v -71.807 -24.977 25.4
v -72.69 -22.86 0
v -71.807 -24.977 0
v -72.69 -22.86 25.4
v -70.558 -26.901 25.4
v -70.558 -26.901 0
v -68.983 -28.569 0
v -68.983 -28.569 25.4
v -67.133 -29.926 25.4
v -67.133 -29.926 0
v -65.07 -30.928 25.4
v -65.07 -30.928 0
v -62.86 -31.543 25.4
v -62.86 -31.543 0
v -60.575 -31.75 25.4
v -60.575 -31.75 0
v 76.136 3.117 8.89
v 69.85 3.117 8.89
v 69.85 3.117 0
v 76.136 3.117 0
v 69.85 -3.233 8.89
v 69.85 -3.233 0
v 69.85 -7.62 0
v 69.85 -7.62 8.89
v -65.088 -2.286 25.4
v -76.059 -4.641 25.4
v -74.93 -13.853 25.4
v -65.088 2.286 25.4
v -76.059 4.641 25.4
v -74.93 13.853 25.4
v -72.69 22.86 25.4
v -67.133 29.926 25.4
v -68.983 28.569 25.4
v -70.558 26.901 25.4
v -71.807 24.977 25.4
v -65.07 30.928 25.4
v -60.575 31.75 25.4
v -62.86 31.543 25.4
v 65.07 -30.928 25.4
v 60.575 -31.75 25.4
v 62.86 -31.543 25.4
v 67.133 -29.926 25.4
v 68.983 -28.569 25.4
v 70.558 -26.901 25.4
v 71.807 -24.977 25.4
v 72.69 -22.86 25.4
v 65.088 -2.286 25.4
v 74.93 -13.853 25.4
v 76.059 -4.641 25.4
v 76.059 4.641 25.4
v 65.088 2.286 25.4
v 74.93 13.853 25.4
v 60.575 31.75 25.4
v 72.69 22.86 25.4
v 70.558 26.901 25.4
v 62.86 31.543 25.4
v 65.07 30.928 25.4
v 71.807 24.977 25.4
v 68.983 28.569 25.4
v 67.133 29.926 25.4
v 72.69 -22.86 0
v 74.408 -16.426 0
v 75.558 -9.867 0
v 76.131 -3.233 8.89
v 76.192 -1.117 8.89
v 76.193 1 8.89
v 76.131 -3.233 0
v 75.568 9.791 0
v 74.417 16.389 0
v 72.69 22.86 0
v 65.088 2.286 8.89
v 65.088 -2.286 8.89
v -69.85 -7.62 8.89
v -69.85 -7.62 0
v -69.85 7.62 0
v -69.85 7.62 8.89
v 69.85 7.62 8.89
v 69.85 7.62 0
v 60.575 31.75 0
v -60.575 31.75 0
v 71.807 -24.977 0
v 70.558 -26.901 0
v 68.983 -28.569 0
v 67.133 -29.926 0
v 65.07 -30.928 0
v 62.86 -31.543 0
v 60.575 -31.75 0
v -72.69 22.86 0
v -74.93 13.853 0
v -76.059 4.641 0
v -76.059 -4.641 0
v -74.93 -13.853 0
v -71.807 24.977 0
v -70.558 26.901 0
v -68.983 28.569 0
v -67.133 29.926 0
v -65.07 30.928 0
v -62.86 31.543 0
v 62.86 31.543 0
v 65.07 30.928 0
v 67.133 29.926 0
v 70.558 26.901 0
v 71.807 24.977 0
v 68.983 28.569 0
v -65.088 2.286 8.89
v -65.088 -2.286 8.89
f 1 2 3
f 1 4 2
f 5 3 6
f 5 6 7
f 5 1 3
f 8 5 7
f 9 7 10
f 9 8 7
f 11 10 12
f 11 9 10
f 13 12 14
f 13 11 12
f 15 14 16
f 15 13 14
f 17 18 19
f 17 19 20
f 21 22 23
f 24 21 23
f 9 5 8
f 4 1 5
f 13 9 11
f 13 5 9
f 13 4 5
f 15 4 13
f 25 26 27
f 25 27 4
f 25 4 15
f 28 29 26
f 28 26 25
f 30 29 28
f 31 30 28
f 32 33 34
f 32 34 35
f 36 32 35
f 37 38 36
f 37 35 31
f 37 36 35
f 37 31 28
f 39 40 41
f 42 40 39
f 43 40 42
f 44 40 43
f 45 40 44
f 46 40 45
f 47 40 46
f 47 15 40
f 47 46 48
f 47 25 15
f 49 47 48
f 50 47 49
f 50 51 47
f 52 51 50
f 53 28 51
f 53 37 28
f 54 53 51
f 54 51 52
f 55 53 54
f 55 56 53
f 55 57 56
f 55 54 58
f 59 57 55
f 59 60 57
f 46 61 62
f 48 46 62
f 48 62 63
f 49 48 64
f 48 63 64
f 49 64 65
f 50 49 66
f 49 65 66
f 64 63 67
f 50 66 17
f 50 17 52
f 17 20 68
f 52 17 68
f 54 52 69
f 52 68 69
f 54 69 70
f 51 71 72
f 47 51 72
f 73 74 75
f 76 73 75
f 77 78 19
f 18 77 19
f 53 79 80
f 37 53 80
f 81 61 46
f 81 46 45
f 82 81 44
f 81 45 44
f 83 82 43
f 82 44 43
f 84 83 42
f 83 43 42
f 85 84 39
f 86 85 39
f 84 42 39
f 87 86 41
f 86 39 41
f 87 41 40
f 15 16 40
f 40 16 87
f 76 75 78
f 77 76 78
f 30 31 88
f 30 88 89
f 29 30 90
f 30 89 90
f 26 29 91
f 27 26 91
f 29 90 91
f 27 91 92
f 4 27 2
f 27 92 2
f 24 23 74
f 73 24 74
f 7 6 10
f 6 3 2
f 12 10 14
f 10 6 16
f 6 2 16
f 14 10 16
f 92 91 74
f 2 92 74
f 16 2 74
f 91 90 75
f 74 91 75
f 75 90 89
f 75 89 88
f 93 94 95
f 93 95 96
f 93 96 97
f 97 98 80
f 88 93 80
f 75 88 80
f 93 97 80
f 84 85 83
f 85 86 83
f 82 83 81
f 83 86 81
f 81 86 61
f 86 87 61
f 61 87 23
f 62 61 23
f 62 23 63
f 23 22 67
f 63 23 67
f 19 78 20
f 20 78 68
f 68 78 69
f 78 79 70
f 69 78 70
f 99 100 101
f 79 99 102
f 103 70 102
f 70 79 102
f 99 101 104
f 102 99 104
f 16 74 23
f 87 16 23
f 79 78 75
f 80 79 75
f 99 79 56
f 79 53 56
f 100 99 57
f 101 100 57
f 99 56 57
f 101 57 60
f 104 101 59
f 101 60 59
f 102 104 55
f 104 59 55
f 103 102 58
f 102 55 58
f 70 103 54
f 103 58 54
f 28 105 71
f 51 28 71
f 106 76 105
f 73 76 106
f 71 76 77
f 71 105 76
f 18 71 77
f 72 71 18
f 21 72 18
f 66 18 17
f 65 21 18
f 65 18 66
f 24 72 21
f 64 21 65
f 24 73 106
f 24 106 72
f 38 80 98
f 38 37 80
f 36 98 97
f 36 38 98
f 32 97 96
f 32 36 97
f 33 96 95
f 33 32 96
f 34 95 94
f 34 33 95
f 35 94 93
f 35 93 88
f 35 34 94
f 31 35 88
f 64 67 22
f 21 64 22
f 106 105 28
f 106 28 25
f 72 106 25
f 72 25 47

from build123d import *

# Parameters (mm, degrees)
F1_DEPTH = 25.4
F2_W     = 130.175
F2_H     = 4.572
F3_DEPTH = 25.401
F5_DEPTH = 8.89
F6_R     = 12.7


with BuildPart() as f1:
    # F0 (on Top) → F1 (new body)
    with BuildSketch(Plane.XY):
        with BuildLine():
            Line((69.270322, 31.75), (-69.270322, 31.75))
            ThreePointArc((-69.270322, 31.75), (-76.2, 0), (-69.270322, -31.75))
            Line((-69.270322, -31.75), (69.270322, -31.75))
            ThreePointArc((69.270322, -31.75), (76.2, 0), (69.270322, 31.75))
        make_face()
    extrude(amount=F1_DEPTH)

    # F2 (on face) → F3 (cut, through all)
    with BuildSketch(Plane(origin=(0, 0, 0), x_dir=(1, 0, 0), z_dir=(0, 0, -1))):
        Rectangle(F2_W, F2_H)
    extrude(amount=-F3_DEPTH, mode=Mode.SUBTRACT)

    # F4 (on face) → F5 (cut)
    with BuildSketch(Plane(origin=(0, 0, 0), x_dir=(1, 0, 0), z_dir=(0, 0, -1))):
        Polygon((69.85, 7.62), (-69.85, 7.62), (-69.85, -7.62), (69.85, -7.62), (69.85, -3.116865), (69.85, 3.233135), align=None)
        with BuildLine():
            Line((76.131379, 3.233135), (69.85, 3.233135))
            Line((69.85, 3.233135), (69.85, -3.116865))
            Line((69.85, -3.116865), (76.136228, -3.116865))
            ThreePointArc((76.136228, -3.116865), (76.199978, 0.058186), (76.131379, 3.233135))
        make_face()
    extrude(amount=-F5_DEPTH, mode=Mode.SUBTRACT)

    # F6
    f6_edges = [f1.edges().sort_by_distance(p)[0] for p in [
        (69.270322, -31.75, 12.7),
        (69.270322, 31.75, 12.7),
        (-69.270322, -31.75, 12.7),
        (-69.270322, 31.75, 12.7),
    ]]
    fillet(f6_edges, radius=F6_R)


solid = f1.part
